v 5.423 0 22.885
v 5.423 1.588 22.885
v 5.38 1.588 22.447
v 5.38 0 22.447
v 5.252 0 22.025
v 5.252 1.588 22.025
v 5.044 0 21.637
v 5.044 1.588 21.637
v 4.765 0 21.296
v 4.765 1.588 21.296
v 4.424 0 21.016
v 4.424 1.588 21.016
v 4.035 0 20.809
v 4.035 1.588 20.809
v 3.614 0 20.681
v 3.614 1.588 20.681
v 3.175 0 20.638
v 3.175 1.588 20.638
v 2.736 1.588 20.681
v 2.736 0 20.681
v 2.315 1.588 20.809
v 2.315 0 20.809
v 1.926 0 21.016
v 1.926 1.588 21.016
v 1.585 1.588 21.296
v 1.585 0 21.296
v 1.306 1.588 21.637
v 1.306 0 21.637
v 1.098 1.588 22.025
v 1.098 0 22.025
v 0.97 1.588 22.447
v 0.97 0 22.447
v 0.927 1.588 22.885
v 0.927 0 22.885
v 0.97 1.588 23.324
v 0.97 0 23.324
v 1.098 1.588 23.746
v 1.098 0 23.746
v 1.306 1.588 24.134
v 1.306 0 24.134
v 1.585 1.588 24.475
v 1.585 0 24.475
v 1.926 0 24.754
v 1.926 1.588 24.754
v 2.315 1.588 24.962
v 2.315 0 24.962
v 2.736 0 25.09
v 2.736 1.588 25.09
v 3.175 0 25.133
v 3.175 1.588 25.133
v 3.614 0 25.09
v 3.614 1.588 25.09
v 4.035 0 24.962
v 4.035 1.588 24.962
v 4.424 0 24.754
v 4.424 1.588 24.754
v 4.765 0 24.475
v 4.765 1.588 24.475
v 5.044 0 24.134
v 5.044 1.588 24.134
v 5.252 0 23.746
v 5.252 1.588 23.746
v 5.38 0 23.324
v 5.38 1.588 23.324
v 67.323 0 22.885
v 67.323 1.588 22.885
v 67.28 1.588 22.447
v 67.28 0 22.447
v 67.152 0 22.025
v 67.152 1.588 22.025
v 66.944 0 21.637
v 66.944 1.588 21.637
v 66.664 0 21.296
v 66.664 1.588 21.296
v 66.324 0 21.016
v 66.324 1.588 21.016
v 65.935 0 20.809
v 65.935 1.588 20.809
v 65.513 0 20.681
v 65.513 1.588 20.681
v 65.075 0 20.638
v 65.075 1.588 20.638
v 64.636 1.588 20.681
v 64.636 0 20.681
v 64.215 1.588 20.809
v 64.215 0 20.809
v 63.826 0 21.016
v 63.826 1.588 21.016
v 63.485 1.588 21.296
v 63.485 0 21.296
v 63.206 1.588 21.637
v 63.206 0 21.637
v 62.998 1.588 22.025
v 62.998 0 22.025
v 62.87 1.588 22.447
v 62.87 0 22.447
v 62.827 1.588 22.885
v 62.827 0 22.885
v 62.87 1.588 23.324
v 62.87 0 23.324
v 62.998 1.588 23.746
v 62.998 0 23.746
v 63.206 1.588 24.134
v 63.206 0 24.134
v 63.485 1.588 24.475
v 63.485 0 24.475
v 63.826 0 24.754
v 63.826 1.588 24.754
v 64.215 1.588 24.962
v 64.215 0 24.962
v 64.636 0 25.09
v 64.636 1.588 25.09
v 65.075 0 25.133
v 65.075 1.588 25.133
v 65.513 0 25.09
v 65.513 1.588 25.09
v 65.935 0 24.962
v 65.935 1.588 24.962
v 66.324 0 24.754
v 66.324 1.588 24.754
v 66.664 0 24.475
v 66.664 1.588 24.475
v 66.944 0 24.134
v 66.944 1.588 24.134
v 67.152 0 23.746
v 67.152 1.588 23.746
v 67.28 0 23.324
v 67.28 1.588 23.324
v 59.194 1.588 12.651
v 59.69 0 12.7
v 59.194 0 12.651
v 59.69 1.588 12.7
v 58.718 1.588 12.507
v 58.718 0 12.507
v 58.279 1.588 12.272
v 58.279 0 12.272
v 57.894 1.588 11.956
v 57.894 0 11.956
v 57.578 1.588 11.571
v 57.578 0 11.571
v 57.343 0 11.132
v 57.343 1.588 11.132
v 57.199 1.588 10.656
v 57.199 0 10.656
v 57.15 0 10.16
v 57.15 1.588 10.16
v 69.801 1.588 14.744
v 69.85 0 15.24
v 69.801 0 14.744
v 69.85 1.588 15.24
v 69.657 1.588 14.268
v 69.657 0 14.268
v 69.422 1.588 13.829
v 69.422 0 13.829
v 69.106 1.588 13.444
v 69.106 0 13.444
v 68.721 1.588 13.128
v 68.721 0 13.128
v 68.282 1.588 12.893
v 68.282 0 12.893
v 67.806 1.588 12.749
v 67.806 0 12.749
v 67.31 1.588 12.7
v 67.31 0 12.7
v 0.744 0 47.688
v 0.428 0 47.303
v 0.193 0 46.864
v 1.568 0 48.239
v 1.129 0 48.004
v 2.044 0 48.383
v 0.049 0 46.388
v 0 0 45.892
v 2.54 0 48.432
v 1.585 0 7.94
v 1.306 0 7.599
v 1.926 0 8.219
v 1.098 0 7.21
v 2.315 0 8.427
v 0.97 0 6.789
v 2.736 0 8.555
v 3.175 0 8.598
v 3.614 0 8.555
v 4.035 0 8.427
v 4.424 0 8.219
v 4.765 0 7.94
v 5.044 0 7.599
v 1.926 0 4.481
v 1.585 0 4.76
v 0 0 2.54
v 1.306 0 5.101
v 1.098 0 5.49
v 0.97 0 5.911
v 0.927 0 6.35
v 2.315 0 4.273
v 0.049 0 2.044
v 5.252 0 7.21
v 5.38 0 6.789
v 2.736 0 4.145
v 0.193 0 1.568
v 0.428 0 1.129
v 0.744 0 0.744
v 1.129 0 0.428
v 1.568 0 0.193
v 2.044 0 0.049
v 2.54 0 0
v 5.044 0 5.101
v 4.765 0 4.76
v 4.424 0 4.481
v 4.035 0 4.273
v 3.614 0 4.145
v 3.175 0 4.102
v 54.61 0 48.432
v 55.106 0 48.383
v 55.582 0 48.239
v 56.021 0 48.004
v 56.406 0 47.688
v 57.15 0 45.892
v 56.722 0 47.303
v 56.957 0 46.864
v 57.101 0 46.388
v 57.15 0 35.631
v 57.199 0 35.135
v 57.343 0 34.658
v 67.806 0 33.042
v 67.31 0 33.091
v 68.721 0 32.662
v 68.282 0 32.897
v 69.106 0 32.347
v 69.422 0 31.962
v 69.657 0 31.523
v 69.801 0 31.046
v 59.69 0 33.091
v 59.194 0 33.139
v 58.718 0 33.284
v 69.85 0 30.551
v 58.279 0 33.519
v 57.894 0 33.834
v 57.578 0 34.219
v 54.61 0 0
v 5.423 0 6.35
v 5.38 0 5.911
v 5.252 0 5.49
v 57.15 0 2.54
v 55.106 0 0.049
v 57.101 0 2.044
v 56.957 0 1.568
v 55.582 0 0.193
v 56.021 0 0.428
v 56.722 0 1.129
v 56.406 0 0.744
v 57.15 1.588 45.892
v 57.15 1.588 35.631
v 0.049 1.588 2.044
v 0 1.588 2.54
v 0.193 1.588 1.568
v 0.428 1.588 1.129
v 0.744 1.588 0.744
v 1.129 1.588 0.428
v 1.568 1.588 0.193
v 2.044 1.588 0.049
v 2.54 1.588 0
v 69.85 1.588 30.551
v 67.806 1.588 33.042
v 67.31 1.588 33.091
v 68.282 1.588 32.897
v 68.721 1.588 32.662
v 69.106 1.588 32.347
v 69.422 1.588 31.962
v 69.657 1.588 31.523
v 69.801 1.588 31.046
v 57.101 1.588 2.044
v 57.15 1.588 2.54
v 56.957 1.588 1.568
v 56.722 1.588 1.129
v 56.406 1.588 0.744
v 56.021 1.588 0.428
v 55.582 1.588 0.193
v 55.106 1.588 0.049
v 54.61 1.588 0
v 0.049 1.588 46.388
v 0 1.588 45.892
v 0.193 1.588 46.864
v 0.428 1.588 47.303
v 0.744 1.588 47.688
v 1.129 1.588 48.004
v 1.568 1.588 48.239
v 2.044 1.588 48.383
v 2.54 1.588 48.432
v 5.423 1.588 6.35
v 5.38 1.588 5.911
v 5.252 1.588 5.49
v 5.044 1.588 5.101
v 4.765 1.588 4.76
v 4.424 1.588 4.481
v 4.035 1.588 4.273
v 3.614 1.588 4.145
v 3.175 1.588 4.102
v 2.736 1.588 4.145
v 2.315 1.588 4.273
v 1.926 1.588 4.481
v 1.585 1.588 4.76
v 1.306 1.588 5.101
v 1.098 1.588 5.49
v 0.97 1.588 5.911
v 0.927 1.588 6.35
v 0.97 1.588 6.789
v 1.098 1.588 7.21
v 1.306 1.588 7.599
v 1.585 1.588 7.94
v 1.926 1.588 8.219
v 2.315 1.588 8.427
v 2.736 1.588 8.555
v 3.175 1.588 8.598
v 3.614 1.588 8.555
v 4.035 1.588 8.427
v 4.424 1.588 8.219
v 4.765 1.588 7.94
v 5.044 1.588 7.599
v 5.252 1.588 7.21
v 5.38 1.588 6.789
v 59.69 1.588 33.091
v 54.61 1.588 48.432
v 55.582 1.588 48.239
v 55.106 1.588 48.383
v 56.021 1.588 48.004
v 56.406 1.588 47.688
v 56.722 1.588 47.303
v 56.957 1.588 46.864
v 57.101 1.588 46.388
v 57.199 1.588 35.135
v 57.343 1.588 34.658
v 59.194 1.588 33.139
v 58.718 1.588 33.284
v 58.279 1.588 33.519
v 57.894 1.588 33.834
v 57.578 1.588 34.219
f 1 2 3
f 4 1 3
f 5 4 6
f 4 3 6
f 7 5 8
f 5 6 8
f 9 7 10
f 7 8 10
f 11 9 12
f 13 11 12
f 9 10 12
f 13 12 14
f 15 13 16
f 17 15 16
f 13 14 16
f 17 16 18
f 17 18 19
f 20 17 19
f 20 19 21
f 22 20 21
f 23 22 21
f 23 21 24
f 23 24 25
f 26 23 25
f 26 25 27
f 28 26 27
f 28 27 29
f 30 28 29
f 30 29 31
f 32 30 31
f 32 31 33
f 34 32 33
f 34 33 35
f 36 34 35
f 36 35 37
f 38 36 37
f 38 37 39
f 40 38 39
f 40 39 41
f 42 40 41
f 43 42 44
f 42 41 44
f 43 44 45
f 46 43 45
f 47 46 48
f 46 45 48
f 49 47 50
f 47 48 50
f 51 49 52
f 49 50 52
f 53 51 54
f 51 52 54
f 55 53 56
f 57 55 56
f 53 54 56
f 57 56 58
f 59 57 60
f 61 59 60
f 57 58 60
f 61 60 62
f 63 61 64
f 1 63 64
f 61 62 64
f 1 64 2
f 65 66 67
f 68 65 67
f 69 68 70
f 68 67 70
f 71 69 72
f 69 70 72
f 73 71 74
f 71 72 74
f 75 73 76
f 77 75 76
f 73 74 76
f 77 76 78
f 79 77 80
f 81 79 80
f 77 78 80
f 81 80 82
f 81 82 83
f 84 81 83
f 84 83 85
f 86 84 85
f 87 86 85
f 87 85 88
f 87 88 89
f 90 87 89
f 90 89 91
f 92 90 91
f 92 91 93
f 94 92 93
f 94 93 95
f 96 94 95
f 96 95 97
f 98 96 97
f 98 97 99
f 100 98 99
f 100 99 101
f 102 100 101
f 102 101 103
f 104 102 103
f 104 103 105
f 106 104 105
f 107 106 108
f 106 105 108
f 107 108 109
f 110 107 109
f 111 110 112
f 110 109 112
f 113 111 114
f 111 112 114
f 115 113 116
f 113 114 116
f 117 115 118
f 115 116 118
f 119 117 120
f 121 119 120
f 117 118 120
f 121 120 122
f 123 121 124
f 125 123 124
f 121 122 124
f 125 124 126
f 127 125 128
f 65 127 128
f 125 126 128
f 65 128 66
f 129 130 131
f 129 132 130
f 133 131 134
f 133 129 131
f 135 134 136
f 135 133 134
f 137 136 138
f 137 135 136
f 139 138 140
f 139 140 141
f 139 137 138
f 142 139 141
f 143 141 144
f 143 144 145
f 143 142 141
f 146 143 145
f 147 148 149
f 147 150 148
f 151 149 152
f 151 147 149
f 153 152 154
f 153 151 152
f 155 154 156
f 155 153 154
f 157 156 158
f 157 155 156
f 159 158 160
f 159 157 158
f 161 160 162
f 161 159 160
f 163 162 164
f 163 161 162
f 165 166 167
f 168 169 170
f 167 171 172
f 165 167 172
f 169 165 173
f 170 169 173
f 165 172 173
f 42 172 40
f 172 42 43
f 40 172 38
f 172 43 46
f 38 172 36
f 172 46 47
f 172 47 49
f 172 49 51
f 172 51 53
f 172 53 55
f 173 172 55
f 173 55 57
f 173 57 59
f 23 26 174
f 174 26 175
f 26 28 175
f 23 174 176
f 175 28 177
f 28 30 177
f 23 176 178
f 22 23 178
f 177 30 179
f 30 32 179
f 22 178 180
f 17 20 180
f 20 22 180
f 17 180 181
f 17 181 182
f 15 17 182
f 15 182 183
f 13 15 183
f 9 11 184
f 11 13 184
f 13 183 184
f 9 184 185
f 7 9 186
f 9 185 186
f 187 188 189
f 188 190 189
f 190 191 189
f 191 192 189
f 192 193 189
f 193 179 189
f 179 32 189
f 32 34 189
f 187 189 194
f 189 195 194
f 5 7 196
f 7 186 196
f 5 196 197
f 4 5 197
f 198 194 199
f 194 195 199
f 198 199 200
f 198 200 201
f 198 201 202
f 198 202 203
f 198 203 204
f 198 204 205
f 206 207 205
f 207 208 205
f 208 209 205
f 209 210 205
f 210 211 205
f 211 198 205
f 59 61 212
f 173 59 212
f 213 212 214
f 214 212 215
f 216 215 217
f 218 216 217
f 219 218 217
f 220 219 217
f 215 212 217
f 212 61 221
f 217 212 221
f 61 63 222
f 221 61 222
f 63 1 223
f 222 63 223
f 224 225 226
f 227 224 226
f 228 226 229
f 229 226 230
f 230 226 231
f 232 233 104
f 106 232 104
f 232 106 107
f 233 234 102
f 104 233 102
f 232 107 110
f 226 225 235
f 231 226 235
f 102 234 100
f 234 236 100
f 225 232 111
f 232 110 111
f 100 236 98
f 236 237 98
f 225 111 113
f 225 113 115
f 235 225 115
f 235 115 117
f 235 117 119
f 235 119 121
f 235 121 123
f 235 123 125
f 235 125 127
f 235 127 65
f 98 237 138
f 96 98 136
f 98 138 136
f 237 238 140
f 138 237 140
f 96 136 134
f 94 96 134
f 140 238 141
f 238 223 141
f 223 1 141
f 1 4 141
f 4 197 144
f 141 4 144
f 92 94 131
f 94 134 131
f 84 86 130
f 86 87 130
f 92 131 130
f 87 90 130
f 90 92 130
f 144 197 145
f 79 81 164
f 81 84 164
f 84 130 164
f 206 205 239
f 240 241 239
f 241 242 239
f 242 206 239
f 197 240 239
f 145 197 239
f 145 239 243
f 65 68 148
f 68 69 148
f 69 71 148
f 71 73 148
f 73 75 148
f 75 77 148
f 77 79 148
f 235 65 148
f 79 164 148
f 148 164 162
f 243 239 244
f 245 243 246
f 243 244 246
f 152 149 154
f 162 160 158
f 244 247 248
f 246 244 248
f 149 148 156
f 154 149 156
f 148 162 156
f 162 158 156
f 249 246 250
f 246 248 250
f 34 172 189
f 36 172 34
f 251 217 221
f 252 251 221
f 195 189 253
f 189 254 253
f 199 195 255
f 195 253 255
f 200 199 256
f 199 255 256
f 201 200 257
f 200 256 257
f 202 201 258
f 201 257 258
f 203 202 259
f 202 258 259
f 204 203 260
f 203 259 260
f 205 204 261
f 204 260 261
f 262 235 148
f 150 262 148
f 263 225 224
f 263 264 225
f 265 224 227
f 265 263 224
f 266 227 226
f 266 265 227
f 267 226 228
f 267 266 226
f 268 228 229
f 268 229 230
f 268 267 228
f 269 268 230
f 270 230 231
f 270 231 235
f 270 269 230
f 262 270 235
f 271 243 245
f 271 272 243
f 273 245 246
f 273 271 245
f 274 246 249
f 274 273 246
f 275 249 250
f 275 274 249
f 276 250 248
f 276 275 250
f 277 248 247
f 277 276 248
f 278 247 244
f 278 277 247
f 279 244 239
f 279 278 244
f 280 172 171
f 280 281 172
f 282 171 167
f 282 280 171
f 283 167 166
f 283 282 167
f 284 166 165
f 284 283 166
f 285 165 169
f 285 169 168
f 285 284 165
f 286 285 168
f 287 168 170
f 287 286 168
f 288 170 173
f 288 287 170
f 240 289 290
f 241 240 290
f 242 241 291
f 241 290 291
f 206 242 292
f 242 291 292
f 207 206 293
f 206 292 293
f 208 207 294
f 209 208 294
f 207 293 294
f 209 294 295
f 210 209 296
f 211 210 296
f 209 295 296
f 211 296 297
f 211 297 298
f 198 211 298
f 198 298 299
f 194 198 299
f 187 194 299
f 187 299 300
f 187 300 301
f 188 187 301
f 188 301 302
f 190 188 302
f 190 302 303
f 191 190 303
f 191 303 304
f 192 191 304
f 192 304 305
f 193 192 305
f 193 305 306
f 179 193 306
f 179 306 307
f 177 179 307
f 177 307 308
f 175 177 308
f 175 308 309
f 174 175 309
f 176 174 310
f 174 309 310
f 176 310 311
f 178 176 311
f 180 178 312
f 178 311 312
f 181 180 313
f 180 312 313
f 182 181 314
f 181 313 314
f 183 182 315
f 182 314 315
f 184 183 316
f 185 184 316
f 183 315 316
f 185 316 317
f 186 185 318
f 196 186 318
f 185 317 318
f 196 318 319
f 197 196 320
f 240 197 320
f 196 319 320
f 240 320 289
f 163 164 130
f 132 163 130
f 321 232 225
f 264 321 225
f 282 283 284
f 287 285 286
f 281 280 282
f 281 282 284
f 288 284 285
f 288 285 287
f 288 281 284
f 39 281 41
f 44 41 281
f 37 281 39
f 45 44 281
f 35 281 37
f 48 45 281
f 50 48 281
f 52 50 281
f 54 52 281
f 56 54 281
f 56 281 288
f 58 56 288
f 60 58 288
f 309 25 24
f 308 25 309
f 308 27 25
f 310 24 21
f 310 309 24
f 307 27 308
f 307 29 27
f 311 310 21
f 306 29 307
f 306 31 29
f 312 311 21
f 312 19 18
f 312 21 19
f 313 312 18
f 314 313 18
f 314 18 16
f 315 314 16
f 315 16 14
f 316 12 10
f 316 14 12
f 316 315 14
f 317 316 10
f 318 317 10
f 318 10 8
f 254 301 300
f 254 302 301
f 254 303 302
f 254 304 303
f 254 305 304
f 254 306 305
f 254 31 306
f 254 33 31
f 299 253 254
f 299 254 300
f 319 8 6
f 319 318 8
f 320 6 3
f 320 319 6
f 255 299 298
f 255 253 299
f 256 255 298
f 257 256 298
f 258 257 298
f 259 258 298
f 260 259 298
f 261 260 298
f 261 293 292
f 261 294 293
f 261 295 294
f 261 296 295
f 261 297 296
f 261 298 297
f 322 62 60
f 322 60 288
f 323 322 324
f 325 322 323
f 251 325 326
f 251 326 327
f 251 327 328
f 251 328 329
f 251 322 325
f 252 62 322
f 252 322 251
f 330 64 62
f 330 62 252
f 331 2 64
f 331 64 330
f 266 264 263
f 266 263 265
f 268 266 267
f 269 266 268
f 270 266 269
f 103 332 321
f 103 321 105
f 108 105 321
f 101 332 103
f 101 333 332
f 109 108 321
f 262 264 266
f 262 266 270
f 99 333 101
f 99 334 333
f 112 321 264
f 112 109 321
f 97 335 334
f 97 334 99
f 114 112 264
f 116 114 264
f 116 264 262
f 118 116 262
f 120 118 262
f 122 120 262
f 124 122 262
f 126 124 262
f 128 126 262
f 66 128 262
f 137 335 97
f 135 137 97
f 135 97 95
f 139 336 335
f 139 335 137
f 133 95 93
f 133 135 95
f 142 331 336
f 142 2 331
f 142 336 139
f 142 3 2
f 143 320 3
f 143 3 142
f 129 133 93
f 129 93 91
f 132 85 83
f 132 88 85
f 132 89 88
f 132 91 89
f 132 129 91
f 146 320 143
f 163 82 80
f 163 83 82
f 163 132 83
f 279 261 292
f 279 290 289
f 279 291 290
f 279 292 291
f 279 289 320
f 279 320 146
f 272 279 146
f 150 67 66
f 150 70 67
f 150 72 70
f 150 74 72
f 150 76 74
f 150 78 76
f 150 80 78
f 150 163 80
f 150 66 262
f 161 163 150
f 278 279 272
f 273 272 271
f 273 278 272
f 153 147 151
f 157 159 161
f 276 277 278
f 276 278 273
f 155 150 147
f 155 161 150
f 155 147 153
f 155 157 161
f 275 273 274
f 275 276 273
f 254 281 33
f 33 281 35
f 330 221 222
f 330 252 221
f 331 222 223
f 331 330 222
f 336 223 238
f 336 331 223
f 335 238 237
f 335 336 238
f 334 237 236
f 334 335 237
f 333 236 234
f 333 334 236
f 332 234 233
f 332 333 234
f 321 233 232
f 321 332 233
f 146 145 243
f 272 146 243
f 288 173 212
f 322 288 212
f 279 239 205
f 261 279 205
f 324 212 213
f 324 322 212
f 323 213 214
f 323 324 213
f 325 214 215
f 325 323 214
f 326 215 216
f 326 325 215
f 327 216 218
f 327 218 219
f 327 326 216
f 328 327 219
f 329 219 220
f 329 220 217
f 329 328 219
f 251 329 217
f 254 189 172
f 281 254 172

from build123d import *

# Parameters (mm, degrees)
BOSS_EXTRUDE1_DEPTH = 1.5875
FILLET1_R           = 2.54
SKETCH2_R           = 2.2479
CUT_EXTRUDE1_DEPTH  = 2.5875


with BuildPart() as part:
    # Sketch1 → Boss-Extrude1 (new body)
    with BuildSketch(Plane(origin=(0, 0, 0), x_dir=(1, 0, 0), z_dir=(0, 1, 0))):
        Polygon((0, 0), (0, -48.432260883), (57.15, -48.432260883), (57.15, -33.090501198), (69.85, -33.090501198), (69.85, -12.7), (57.15, -12.7), (57.15, 0), align=None)
    extrude(amount=BOSS_EXTRUDE1_DEPTH)

    # Fillet1
    fillet1_edges = [part.edges().sort_by_distance(p)[0] for p in [
        (57.15, 0.79375, 0),
        (57.15, 0.79375, 12.7),
        (69.85, 0.79375, 12.7),
        (69.85, 0.79375, 33.090501198),
        (57.15, 0.79375, 33.090501198),
        (57.15, 0.79375, 48.432260883),
        (0, 0.79375, 48.432260883),
        (0, 0.79375, 0),
    ]]
    fillet(fillet1_edges, radius=FILLET1_R)

    # Sketch2 → Cut-Extrude1 (cut, through all)
    with BuildSketch(Plane(origin=(0, 1.5875, 0), x_dir=(1, 0, 0), z_dir=(0, 1, 0))):
        with Locations((3.175, -6.35)):
            Circle(SKETCH2_R)
        with Locations((3.175, -22.8854)):
            Circle(SKETCH2_R)
        with Locations((65.0748, -22.8854)):
            Circle(SKETCH2_R)
    extrude(amount=-CUT_EXTRUDE1_DEPTH, mode=Mode.SUBTRACT)


solid = part.part
